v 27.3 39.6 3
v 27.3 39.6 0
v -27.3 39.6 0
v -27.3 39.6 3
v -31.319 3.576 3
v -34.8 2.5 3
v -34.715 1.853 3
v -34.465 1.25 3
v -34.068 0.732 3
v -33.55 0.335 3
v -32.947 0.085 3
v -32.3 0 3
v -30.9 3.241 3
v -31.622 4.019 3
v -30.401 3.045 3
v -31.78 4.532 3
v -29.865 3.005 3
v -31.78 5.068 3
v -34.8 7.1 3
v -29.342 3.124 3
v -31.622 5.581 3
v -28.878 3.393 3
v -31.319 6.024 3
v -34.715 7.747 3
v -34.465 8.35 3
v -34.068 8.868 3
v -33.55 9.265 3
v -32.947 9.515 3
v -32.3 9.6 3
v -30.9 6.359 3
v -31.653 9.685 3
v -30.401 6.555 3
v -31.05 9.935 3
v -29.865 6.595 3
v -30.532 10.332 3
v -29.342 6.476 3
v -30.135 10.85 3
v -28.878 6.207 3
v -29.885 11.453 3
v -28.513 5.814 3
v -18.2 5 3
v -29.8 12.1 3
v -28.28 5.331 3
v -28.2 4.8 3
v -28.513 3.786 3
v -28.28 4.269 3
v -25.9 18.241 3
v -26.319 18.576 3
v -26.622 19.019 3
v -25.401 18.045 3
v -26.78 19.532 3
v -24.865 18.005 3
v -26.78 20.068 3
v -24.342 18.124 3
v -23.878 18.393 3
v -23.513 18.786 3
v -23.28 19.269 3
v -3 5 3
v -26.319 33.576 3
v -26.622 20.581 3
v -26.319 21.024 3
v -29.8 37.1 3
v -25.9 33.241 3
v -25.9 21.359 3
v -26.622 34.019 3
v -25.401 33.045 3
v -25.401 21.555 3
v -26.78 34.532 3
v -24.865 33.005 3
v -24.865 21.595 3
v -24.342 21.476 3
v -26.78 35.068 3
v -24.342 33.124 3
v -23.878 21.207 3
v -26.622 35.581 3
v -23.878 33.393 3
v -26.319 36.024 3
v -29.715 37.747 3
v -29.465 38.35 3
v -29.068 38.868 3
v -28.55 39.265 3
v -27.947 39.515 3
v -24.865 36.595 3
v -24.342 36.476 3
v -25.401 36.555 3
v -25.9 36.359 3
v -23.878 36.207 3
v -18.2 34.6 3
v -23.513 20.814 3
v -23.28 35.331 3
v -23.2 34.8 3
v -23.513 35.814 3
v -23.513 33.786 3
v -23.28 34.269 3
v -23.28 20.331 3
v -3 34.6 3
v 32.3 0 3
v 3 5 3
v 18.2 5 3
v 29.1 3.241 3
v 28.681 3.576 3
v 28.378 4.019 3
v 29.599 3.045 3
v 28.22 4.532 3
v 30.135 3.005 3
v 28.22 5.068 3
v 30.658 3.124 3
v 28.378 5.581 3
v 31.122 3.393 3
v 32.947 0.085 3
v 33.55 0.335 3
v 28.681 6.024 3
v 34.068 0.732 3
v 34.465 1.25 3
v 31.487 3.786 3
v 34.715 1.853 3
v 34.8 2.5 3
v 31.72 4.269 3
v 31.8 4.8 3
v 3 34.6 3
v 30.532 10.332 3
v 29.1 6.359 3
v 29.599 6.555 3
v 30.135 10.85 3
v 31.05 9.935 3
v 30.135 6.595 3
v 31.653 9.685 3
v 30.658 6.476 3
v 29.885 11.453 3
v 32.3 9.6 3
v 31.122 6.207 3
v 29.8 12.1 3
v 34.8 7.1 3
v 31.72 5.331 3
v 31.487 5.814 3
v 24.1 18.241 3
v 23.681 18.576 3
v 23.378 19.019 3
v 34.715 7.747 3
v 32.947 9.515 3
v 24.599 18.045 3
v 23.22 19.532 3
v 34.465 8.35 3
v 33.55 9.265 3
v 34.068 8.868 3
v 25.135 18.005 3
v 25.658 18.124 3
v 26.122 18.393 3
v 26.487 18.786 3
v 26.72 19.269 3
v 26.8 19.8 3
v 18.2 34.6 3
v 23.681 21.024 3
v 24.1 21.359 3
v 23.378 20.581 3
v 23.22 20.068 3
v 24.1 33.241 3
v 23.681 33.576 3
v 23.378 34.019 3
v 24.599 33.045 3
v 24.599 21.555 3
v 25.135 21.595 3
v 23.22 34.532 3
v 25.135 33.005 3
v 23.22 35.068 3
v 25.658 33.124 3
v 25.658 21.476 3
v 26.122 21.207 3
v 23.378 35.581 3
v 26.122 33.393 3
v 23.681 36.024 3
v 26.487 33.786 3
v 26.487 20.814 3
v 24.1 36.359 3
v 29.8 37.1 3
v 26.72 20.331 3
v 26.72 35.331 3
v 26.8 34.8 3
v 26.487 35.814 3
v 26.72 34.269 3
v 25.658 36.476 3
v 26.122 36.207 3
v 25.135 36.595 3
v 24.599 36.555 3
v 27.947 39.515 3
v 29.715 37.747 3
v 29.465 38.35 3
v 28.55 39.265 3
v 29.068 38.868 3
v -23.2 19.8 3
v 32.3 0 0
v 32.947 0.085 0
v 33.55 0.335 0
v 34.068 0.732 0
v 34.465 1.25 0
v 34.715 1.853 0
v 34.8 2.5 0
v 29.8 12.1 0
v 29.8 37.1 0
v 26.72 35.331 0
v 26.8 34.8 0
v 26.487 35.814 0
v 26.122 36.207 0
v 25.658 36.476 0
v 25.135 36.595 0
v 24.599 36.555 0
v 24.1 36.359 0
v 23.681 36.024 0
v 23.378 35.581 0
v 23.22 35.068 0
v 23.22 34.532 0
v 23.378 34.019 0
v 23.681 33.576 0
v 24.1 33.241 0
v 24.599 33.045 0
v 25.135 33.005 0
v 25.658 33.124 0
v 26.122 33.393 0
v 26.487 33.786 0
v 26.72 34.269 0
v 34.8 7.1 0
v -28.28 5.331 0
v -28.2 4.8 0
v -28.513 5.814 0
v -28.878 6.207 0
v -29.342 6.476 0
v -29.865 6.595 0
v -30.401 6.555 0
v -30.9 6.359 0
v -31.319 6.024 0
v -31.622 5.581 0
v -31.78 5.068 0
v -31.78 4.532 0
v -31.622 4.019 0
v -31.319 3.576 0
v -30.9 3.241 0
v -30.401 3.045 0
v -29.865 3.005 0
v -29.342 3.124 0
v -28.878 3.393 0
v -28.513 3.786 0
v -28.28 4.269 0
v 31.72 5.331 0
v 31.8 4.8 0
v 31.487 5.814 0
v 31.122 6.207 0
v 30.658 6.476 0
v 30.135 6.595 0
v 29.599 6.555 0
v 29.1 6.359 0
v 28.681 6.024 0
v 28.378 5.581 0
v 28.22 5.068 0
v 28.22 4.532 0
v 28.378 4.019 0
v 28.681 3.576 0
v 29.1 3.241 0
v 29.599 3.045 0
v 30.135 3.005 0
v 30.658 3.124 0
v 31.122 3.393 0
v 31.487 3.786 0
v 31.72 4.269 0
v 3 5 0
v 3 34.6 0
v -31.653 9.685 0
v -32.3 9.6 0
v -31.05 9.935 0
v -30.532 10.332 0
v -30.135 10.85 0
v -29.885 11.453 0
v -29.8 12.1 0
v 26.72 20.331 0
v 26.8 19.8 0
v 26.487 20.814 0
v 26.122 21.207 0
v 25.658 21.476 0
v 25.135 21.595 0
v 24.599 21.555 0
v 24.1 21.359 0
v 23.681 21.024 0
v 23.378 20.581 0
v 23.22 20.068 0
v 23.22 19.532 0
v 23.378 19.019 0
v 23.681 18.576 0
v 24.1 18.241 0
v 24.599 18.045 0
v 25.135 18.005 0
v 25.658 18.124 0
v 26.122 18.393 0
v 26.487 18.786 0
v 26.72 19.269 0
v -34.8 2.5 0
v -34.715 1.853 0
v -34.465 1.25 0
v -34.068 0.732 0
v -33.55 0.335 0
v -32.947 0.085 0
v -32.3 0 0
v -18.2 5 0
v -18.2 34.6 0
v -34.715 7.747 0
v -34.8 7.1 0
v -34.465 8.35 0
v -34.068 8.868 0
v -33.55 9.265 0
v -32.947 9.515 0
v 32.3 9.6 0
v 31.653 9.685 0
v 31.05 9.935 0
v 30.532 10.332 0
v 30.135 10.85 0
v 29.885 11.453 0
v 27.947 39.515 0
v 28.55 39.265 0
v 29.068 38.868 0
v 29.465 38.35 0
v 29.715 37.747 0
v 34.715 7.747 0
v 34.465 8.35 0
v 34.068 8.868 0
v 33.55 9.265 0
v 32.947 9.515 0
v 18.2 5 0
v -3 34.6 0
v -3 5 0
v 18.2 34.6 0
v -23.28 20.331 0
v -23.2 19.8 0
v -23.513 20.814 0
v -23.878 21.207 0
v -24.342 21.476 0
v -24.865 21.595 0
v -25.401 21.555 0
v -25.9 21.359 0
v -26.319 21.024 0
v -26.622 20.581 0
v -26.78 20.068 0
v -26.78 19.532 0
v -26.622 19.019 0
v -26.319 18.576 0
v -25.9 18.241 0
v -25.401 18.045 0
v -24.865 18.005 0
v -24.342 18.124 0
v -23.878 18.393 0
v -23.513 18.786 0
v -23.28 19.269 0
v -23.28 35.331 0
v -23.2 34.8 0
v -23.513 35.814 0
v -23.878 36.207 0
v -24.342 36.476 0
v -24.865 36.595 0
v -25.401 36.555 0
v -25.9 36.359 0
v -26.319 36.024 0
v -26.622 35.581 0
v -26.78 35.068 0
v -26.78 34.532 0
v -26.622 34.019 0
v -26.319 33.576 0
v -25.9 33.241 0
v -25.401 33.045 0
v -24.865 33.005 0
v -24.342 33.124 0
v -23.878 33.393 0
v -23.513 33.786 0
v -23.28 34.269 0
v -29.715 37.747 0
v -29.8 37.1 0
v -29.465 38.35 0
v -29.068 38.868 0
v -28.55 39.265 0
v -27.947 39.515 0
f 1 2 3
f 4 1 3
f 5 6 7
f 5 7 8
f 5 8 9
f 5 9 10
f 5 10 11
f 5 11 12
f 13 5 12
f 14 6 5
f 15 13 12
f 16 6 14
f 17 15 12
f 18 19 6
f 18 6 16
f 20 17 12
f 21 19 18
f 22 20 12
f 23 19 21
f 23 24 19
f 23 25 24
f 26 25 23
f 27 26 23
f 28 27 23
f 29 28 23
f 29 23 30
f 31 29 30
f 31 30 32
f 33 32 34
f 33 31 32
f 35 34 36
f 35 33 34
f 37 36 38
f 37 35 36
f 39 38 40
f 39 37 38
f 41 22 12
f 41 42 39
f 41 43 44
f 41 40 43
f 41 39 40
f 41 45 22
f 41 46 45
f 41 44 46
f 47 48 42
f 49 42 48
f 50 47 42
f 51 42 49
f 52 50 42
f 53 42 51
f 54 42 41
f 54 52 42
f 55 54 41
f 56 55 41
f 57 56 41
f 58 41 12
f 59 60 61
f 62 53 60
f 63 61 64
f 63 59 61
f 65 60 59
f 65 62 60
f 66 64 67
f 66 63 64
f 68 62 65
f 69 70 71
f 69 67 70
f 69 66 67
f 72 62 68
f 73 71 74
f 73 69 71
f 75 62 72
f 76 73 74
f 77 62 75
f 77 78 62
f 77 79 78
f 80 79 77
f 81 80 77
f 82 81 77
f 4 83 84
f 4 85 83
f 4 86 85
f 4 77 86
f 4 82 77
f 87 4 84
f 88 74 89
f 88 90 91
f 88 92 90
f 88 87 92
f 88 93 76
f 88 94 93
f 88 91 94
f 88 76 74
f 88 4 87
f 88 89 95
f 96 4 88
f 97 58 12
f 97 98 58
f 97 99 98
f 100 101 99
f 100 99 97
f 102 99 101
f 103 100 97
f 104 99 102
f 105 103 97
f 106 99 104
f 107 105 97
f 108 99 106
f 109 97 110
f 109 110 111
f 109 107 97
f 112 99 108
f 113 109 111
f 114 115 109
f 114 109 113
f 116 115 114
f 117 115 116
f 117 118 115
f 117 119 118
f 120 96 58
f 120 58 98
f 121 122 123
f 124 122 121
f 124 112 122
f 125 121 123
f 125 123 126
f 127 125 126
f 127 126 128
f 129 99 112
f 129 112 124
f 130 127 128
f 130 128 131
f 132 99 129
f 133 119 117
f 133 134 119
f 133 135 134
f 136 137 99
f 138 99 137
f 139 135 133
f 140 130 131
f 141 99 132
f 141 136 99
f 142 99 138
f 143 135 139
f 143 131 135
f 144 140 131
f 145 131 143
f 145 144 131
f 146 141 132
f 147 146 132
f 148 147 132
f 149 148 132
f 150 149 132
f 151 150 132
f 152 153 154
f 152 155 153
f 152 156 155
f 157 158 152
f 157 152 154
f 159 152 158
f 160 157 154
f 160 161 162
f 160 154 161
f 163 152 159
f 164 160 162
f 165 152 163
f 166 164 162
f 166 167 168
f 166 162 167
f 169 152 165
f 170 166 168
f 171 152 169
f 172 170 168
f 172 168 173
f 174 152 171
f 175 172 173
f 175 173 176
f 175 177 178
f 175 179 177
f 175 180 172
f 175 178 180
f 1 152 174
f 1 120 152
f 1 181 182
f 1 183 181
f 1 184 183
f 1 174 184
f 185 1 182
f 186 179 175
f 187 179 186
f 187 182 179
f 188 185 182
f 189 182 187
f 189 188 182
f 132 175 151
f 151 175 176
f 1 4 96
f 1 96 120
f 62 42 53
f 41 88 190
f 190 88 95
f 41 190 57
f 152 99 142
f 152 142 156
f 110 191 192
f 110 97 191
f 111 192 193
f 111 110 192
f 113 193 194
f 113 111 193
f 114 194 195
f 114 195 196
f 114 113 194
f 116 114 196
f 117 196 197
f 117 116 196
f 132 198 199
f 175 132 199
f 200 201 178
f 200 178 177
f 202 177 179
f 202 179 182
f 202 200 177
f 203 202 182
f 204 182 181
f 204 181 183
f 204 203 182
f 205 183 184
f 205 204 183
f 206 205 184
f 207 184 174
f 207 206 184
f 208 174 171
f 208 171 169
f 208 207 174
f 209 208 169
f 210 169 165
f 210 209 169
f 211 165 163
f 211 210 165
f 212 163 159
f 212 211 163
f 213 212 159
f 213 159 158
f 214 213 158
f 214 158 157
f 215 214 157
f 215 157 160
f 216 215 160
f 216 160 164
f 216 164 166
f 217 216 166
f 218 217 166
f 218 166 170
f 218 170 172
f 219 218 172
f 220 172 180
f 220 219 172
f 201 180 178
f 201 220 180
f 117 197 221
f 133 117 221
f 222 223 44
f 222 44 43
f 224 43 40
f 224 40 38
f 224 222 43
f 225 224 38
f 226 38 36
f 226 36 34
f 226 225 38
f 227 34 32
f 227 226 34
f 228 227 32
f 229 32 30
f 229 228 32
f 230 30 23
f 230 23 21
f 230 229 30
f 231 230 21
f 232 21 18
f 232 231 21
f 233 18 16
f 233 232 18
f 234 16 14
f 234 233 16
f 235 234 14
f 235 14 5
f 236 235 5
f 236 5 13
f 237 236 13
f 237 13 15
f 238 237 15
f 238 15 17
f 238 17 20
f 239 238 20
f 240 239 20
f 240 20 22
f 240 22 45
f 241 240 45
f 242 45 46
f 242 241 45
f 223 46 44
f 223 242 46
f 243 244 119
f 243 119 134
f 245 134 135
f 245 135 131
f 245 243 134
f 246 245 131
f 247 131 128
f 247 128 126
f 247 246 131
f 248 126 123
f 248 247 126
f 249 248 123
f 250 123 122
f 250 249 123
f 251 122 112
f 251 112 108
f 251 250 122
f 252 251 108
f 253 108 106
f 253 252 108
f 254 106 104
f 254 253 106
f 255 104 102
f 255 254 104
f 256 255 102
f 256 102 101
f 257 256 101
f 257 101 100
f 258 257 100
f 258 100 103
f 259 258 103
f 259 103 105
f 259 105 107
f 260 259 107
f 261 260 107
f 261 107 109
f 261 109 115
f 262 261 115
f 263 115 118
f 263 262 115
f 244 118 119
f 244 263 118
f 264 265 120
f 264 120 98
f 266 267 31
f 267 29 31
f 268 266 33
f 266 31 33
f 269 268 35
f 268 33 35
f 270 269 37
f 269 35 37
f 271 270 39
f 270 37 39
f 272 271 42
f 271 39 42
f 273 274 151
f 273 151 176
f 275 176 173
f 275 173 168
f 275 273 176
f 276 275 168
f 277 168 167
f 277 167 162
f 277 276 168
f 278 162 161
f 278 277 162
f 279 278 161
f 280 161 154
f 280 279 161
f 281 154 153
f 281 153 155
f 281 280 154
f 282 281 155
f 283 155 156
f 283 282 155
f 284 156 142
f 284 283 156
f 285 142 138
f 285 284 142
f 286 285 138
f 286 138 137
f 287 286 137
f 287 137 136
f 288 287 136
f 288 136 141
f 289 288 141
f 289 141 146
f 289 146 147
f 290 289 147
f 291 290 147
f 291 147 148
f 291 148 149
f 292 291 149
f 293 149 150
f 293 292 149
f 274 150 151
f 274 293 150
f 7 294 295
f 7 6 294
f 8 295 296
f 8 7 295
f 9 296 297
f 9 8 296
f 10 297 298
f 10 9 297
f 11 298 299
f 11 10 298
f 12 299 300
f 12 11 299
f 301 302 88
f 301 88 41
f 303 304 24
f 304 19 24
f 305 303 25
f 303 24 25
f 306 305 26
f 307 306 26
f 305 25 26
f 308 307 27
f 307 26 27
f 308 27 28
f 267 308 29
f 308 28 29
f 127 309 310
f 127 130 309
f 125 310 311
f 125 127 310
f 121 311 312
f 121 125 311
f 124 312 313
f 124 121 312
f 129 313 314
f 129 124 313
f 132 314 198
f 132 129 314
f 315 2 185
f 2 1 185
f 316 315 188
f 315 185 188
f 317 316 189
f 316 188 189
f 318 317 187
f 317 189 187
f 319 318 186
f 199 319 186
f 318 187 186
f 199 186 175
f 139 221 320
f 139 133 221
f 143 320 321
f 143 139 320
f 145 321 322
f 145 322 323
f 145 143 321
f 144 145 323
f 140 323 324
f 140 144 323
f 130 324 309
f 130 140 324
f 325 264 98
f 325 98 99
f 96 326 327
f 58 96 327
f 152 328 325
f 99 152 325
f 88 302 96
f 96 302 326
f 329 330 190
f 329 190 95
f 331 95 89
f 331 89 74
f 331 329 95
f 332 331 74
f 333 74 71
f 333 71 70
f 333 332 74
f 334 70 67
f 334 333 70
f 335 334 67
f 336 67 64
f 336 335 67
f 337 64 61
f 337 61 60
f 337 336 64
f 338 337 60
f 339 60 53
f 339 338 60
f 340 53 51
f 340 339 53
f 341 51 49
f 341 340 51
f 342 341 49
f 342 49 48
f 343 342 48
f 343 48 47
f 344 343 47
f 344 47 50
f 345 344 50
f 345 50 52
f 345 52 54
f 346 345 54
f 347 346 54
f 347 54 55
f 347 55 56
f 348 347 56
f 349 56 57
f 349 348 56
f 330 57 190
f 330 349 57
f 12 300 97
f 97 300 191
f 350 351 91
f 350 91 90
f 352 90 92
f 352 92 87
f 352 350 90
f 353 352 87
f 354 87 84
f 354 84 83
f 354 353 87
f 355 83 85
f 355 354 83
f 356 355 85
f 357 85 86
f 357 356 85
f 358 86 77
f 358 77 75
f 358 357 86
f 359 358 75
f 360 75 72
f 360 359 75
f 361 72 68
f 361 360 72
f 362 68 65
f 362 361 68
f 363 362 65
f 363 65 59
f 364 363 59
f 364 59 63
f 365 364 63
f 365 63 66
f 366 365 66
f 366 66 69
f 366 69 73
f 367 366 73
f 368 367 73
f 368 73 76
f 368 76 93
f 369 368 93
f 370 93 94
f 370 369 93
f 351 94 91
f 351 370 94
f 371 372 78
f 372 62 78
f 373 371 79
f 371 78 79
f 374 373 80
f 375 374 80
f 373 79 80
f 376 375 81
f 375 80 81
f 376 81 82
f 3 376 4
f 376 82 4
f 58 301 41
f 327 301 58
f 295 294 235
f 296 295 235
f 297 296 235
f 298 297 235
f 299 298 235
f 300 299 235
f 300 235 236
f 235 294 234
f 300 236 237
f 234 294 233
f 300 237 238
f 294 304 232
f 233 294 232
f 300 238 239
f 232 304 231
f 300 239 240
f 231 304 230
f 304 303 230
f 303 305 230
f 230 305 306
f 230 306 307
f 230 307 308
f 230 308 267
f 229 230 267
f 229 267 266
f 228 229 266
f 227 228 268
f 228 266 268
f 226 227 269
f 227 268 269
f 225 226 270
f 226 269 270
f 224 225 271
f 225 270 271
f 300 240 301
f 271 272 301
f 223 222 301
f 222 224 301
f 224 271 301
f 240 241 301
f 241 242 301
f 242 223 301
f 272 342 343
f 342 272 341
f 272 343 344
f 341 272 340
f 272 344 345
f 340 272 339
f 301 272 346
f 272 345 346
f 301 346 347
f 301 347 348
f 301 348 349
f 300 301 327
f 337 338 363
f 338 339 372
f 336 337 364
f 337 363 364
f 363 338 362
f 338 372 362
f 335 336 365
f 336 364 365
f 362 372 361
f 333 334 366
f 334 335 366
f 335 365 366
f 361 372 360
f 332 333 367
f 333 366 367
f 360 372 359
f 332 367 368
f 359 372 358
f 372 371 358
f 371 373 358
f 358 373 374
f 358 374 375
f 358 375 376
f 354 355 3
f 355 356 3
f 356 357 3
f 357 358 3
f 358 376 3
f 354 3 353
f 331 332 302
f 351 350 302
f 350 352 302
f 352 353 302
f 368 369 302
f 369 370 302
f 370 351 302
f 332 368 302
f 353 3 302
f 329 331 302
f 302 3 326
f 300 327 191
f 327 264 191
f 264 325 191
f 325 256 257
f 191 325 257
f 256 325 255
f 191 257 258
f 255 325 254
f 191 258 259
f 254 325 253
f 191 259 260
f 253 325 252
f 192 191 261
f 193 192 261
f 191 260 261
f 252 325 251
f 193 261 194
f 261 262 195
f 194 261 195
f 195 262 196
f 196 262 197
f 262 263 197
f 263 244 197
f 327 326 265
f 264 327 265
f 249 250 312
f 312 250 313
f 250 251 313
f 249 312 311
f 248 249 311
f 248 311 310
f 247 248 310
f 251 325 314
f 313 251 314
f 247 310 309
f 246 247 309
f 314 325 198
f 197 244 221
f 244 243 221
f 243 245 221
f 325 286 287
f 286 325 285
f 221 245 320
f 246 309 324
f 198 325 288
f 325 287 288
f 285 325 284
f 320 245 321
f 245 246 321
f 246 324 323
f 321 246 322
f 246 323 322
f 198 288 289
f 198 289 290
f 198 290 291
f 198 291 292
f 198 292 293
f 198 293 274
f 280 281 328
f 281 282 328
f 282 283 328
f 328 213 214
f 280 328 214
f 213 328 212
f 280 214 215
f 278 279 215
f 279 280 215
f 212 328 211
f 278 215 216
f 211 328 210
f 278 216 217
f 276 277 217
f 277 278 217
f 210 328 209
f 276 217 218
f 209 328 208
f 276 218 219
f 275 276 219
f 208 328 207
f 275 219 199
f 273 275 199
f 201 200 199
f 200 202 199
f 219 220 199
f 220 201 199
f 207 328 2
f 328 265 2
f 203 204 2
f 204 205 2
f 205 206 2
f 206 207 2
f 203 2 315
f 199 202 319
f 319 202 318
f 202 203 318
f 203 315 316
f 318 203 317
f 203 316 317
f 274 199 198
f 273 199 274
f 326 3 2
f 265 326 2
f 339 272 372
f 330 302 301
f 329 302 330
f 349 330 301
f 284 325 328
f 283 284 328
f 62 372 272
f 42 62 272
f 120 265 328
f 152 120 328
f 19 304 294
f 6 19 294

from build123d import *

# Parameters (mm, degrees)
F0_R     = 1.8
F1_DEPTH = 3
F2_R     = 2.49999
F3_W     = 15.2
F3_H     = 29.6
F4_DEPTH = 3


# Not quite as in the source:
# - a fillet or chamfer is up to 0.001 mm smaller than in the source, because OpenCascade refuses the exact size


with BuildPart() as f1:
    # F0 (on Top) → F1 (new body)
    with BuildSketch(Plane.XY):
        Polygon((-34.8, 9.6), (-34.8, 0), (34.8, 0), (34.8, 9.6), (29.8, 9.6), (29.8, 39.6), (-29.8, 39.6), (-29.8, 9.6), align=None)
        with Locations((-30, 4.8)):
            Circle(F0_R, mode=Mode.SUBTRACT)
        with Locations((30, 4.8)):
            Circle(F0_R, mode=Mode.SUBTRACT)
        with Locations((-25, 19.8)):
            Circle(F0_R, mode=Mode.SUBTRACT)
        with Locations((-25, 34.8)):
            Circle(F0_R, mode=Mode.SUBTRACT)
        with Locations((25, 19.8)):
            Circle(F0_R, mode=Mode.SUBTRACT)
        with Locations((25, 34.8)):
            Circle(F0_R, mode=Mode.SUBTRACT)
    extrude(amount=F1_DEPTH)

    # F2 (radius 2.5 in the source; OpenCascade refuses exactly that, so slightly less here)
    f2_edges = [f1.edges().sort_by_distance(p)[0] for p in [
        (-34.8, 0, 1.5),
        (-34.8, 9.6, 1.5),
        (-29.8, 9.6, 1.5),
        (34.8, 0, 1.5),
        (29.8, 9.6, 1.5),
        (34.8, 9.6, 1.5),
        (29.8, 39.6, 1.5),
        (-29.8, 39.6, 1.5),
    ]]
    fillet(f2_edges, radius=F2_R)

    # F3 (on face) → F4 (cut, through all)
    with BuildSketch(Plane(origin=(0, 0, 0), x_dir=(1, 0, 0), z_dir=(0, 0, -1))):
        with Locations((10.6, -19.8)):
            Rectangle(F3_W, F3_H)
        with Locations((-10.6, -19.8)):
            Rectangle(F3_W, F3_H)
    extrude(amount=-F4_DEPTH, mode=Mode.SUBTRACT)


solid = f1.part
